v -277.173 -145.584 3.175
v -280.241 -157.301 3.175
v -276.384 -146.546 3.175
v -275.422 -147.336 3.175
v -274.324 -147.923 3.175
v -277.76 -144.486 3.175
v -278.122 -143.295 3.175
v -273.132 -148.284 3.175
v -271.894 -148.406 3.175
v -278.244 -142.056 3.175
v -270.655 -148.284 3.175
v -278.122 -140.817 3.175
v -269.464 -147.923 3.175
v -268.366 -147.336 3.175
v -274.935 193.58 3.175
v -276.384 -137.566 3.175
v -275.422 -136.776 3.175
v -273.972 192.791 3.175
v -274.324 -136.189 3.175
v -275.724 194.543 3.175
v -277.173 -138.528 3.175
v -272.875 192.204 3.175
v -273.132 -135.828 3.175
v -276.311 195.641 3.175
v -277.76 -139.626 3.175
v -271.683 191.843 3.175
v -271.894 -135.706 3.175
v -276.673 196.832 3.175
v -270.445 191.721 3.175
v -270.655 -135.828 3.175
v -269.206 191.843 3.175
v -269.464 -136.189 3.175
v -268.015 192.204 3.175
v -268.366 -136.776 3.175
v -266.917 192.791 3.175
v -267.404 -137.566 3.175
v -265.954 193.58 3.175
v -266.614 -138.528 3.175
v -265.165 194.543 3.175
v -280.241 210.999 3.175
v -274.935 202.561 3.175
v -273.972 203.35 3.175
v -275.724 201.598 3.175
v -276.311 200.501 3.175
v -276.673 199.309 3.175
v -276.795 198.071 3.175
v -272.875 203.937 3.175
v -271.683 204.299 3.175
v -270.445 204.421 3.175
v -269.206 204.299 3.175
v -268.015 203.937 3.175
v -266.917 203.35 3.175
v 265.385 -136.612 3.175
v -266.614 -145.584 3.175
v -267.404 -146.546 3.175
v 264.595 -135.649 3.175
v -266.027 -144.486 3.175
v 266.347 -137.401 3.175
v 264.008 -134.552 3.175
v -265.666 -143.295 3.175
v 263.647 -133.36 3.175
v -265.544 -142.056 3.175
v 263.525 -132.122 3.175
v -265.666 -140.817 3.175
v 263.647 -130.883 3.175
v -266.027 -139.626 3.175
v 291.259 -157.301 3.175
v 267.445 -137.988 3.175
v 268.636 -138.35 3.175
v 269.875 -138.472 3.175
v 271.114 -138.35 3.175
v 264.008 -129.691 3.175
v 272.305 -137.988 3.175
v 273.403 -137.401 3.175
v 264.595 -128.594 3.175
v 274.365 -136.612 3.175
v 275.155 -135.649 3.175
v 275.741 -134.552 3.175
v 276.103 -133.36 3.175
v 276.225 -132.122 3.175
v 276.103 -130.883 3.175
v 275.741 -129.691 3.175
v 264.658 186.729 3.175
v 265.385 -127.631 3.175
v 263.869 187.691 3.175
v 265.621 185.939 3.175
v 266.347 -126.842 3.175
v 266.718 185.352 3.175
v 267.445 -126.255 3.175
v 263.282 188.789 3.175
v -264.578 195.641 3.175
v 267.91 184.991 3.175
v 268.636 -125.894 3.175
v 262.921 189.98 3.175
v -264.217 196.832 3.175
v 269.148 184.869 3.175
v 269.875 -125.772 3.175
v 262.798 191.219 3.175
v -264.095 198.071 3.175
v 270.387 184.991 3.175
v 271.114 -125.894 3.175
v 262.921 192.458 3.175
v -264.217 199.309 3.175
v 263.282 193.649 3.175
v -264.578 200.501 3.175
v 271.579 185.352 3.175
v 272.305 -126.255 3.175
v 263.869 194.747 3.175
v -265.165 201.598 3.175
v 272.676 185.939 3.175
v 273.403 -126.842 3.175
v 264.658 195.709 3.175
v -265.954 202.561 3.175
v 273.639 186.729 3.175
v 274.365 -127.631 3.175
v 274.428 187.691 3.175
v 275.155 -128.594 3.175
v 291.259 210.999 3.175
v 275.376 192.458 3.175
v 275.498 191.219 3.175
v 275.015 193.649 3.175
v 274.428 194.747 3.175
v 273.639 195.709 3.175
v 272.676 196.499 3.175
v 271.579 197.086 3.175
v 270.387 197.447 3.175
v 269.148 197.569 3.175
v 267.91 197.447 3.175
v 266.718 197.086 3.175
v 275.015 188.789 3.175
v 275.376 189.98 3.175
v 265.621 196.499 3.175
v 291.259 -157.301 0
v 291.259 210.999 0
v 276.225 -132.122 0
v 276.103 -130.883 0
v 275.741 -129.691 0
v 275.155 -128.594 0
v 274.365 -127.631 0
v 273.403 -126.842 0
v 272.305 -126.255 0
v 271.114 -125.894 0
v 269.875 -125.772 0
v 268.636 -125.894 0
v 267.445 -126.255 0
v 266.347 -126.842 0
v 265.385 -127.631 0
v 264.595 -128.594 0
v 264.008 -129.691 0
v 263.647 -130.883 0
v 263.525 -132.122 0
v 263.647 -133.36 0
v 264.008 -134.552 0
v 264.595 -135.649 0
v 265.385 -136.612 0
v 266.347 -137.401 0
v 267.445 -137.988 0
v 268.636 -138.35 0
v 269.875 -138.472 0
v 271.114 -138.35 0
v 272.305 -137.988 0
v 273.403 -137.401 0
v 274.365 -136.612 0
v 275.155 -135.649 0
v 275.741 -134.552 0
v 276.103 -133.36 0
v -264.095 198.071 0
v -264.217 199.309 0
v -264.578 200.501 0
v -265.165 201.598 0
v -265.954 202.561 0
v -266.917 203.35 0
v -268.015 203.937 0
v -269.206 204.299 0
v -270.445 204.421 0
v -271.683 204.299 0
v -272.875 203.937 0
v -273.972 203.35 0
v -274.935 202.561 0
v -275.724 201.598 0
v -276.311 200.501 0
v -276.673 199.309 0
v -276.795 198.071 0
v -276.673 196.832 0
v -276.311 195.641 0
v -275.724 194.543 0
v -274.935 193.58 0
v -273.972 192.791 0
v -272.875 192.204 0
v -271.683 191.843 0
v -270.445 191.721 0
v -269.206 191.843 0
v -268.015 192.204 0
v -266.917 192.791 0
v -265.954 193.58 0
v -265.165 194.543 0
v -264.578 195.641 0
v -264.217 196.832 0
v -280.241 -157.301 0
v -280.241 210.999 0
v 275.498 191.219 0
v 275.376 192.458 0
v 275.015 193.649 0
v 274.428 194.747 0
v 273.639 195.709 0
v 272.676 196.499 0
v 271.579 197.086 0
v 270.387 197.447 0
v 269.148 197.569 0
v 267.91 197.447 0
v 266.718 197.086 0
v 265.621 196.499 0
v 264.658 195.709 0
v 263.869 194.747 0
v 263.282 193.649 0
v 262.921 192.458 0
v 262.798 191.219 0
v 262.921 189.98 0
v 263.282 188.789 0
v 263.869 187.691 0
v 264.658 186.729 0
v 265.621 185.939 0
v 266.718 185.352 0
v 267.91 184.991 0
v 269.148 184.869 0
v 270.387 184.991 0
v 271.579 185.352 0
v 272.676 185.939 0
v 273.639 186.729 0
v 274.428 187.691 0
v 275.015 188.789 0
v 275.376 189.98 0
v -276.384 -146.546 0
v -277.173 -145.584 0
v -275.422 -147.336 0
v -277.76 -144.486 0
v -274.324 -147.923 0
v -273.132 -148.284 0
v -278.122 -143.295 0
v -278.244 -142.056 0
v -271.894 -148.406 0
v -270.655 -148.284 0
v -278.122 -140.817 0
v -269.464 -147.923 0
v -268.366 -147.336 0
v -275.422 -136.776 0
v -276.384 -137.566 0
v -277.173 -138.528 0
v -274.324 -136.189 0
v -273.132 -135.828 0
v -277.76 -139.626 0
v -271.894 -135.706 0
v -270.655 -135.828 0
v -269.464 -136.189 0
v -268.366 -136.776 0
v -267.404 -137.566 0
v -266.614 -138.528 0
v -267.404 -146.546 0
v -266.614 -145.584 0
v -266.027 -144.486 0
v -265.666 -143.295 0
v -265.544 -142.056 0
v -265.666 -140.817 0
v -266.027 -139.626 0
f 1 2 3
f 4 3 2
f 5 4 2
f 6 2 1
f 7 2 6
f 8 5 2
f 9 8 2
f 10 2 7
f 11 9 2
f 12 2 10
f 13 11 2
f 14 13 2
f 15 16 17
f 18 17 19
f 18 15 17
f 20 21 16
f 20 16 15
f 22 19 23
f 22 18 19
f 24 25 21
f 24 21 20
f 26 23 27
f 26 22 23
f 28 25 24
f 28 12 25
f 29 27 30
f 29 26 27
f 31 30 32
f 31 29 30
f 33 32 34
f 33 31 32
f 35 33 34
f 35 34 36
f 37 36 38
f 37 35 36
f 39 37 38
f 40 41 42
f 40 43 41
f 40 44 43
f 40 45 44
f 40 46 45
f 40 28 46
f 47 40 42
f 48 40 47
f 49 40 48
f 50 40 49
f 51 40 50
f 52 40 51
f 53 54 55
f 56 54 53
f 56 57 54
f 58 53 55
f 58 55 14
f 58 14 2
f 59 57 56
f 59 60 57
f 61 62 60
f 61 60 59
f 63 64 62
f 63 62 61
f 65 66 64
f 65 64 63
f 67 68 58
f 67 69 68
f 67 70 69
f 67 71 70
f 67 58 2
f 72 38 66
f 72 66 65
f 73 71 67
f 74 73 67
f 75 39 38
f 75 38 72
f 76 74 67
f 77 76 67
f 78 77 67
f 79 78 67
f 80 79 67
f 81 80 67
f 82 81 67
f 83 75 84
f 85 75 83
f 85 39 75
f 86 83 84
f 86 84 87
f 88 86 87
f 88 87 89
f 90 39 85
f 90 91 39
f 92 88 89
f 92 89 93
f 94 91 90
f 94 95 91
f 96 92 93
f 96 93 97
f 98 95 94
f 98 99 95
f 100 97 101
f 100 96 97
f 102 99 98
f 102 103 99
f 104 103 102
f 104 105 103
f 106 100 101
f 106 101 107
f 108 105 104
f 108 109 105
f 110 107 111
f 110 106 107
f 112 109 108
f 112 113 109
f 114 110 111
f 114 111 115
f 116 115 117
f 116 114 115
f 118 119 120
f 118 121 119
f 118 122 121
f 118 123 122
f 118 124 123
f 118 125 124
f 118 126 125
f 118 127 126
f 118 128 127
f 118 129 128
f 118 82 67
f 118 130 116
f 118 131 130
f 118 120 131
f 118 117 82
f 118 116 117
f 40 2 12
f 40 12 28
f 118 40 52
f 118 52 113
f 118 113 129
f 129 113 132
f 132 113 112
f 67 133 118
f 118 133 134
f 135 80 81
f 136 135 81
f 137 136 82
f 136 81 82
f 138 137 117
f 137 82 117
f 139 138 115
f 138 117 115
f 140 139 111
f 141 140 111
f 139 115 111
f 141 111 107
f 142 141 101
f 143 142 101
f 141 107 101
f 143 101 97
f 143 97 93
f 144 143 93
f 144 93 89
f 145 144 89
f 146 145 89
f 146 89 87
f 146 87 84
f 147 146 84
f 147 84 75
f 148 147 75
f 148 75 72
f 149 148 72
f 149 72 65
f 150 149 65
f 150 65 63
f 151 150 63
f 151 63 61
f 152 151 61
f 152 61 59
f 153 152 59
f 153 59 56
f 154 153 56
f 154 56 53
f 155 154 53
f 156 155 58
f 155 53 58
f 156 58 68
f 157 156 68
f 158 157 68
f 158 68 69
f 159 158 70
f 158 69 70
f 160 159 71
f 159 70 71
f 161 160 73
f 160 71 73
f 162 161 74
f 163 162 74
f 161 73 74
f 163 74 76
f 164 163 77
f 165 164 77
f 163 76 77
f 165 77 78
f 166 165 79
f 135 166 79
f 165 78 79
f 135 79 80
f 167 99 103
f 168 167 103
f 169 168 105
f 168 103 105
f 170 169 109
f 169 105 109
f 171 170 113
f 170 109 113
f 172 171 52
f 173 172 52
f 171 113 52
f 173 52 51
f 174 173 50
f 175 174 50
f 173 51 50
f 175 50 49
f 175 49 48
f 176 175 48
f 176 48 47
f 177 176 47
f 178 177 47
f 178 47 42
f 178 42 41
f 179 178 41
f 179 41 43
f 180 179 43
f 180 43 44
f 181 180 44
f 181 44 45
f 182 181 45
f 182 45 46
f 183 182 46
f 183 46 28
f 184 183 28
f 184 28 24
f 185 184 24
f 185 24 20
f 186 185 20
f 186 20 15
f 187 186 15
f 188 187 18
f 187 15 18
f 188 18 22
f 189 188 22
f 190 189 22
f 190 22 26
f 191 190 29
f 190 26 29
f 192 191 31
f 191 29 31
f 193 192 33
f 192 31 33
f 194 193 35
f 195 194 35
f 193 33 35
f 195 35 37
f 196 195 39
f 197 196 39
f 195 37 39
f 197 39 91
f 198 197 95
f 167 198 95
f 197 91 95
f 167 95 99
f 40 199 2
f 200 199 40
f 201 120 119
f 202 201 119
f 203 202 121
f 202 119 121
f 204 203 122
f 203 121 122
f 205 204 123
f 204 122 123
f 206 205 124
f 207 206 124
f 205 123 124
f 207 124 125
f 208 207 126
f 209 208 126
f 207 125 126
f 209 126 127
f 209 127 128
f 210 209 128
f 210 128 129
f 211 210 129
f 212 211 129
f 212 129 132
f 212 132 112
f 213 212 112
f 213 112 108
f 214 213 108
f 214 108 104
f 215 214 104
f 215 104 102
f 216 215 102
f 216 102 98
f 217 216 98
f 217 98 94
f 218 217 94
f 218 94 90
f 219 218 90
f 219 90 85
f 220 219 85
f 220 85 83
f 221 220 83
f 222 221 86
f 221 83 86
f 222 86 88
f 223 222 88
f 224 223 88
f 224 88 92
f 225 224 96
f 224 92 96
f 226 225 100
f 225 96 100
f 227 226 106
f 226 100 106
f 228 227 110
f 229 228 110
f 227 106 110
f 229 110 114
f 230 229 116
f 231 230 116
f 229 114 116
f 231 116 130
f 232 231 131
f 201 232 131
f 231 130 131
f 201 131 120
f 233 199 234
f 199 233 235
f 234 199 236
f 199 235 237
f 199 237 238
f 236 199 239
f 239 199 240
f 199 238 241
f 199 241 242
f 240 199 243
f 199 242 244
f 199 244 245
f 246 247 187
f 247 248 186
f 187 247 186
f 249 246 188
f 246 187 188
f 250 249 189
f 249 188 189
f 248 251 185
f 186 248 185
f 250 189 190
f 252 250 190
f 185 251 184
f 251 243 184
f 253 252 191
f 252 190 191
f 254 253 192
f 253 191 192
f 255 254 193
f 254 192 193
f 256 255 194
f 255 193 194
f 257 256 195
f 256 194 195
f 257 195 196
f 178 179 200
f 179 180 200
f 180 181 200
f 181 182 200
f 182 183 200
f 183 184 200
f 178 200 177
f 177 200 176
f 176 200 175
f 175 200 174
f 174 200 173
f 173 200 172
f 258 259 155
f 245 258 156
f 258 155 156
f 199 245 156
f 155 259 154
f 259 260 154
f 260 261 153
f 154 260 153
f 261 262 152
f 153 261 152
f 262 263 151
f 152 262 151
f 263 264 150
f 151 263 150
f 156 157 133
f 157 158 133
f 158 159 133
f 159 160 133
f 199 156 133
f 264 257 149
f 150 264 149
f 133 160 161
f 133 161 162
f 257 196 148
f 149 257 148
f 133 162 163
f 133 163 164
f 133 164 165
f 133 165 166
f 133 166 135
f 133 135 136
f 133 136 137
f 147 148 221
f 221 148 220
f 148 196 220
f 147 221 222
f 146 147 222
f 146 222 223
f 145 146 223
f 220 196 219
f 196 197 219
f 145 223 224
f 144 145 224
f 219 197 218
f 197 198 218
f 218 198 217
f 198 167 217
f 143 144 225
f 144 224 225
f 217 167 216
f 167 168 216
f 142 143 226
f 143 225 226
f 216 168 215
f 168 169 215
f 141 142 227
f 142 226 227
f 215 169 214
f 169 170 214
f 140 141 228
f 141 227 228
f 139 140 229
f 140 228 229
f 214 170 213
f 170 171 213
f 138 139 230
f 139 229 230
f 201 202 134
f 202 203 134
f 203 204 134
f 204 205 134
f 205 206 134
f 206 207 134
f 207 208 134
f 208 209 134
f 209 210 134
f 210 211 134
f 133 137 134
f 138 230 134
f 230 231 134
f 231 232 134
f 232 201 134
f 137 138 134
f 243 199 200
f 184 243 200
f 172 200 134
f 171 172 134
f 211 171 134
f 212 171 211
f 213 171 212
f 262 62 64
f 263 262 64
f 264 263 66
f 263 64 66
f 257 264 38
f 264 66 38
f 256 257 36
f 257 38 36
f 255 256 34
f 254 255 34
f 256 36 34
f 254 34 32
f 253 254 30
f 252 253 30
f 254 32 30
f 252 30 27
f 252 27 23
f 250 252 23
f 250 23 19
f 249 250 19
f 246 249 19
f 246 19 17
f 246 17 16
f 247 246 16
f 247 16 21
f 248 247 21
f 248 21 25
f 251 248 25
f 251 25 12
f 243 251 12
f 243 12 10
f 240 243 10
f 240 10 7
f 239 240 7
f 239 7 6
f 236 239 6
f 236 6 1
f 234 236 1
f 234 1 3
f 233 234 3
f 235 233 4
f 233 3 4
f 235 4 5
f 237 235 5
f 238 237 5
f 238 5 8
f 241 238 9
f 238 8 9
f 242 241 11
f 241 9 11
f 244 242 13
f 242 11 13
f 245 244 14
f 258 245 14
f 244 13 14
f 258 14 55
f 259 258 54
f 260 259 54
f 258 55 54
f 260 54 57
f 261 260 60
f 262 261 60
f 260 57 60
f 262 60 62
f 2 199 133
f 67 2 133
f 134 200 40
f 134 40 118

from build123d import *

# Parameters (mm, degrees)
F0_W     = 571.5
F0_H     = 368.3
F1_DEPTH = 3.175
F2_R     = 6.35
F3_DEPTH = 25.4
F4_R     = 6.35
F5_DEPTH = 25.4
F6_R     = 6.35
F7_DEPTH = 25.4
F8_R     = 6.35
F9_DEPTH = 25.4


with BuildPart() as f1:
    # F0 (on Top) → F1 (new body)
    with BuildSketch(Plane.XY):
        with Locations((5.508766, 26.848752)):
            Rectangle(F0_W, F0_H)
    extrude(amount=F1_DEPTH)

    # F2 (on face) → F3 (cut)
    with BuildSketch(Plane.XY.offset(3.175)):
        with Locations((-271.89365, -142.056122)):
            Circle(F2_R)
    extrude(amount=-F3_DEPTH, mode=Mode.SUBTRACT)

    # F4 (on face) → F5 (cut)
    with BuildSketch(Plane.XY.offset(3.175)):
        with Locations((-270.444542, 198.070601)):
            Circle(F4_R)
    extrude(amount=-F5_DEPTH, mode=Mode.SUBTRACT)

    # F6 (on face) → F7 (cut)
    with BuildSketch(Plane.XY.offset(3.175)):
        with Locations((269.148499, 191.218898)):
            Circle(F6_R)
    extrude(amount=-F7_DEPTH, mode=Mode.SUBTRACT)

    # F8 (on face) → F9 (cut)
    with BuildSketch(Plane.XY.offset(3.175)):
        with Locations((269.874841, -132.121533)):
            Circle(F8_R)
    extrude(amount=-F9_DEPTH, mode=Mode.SUBTRACT)


solid = f1.part
